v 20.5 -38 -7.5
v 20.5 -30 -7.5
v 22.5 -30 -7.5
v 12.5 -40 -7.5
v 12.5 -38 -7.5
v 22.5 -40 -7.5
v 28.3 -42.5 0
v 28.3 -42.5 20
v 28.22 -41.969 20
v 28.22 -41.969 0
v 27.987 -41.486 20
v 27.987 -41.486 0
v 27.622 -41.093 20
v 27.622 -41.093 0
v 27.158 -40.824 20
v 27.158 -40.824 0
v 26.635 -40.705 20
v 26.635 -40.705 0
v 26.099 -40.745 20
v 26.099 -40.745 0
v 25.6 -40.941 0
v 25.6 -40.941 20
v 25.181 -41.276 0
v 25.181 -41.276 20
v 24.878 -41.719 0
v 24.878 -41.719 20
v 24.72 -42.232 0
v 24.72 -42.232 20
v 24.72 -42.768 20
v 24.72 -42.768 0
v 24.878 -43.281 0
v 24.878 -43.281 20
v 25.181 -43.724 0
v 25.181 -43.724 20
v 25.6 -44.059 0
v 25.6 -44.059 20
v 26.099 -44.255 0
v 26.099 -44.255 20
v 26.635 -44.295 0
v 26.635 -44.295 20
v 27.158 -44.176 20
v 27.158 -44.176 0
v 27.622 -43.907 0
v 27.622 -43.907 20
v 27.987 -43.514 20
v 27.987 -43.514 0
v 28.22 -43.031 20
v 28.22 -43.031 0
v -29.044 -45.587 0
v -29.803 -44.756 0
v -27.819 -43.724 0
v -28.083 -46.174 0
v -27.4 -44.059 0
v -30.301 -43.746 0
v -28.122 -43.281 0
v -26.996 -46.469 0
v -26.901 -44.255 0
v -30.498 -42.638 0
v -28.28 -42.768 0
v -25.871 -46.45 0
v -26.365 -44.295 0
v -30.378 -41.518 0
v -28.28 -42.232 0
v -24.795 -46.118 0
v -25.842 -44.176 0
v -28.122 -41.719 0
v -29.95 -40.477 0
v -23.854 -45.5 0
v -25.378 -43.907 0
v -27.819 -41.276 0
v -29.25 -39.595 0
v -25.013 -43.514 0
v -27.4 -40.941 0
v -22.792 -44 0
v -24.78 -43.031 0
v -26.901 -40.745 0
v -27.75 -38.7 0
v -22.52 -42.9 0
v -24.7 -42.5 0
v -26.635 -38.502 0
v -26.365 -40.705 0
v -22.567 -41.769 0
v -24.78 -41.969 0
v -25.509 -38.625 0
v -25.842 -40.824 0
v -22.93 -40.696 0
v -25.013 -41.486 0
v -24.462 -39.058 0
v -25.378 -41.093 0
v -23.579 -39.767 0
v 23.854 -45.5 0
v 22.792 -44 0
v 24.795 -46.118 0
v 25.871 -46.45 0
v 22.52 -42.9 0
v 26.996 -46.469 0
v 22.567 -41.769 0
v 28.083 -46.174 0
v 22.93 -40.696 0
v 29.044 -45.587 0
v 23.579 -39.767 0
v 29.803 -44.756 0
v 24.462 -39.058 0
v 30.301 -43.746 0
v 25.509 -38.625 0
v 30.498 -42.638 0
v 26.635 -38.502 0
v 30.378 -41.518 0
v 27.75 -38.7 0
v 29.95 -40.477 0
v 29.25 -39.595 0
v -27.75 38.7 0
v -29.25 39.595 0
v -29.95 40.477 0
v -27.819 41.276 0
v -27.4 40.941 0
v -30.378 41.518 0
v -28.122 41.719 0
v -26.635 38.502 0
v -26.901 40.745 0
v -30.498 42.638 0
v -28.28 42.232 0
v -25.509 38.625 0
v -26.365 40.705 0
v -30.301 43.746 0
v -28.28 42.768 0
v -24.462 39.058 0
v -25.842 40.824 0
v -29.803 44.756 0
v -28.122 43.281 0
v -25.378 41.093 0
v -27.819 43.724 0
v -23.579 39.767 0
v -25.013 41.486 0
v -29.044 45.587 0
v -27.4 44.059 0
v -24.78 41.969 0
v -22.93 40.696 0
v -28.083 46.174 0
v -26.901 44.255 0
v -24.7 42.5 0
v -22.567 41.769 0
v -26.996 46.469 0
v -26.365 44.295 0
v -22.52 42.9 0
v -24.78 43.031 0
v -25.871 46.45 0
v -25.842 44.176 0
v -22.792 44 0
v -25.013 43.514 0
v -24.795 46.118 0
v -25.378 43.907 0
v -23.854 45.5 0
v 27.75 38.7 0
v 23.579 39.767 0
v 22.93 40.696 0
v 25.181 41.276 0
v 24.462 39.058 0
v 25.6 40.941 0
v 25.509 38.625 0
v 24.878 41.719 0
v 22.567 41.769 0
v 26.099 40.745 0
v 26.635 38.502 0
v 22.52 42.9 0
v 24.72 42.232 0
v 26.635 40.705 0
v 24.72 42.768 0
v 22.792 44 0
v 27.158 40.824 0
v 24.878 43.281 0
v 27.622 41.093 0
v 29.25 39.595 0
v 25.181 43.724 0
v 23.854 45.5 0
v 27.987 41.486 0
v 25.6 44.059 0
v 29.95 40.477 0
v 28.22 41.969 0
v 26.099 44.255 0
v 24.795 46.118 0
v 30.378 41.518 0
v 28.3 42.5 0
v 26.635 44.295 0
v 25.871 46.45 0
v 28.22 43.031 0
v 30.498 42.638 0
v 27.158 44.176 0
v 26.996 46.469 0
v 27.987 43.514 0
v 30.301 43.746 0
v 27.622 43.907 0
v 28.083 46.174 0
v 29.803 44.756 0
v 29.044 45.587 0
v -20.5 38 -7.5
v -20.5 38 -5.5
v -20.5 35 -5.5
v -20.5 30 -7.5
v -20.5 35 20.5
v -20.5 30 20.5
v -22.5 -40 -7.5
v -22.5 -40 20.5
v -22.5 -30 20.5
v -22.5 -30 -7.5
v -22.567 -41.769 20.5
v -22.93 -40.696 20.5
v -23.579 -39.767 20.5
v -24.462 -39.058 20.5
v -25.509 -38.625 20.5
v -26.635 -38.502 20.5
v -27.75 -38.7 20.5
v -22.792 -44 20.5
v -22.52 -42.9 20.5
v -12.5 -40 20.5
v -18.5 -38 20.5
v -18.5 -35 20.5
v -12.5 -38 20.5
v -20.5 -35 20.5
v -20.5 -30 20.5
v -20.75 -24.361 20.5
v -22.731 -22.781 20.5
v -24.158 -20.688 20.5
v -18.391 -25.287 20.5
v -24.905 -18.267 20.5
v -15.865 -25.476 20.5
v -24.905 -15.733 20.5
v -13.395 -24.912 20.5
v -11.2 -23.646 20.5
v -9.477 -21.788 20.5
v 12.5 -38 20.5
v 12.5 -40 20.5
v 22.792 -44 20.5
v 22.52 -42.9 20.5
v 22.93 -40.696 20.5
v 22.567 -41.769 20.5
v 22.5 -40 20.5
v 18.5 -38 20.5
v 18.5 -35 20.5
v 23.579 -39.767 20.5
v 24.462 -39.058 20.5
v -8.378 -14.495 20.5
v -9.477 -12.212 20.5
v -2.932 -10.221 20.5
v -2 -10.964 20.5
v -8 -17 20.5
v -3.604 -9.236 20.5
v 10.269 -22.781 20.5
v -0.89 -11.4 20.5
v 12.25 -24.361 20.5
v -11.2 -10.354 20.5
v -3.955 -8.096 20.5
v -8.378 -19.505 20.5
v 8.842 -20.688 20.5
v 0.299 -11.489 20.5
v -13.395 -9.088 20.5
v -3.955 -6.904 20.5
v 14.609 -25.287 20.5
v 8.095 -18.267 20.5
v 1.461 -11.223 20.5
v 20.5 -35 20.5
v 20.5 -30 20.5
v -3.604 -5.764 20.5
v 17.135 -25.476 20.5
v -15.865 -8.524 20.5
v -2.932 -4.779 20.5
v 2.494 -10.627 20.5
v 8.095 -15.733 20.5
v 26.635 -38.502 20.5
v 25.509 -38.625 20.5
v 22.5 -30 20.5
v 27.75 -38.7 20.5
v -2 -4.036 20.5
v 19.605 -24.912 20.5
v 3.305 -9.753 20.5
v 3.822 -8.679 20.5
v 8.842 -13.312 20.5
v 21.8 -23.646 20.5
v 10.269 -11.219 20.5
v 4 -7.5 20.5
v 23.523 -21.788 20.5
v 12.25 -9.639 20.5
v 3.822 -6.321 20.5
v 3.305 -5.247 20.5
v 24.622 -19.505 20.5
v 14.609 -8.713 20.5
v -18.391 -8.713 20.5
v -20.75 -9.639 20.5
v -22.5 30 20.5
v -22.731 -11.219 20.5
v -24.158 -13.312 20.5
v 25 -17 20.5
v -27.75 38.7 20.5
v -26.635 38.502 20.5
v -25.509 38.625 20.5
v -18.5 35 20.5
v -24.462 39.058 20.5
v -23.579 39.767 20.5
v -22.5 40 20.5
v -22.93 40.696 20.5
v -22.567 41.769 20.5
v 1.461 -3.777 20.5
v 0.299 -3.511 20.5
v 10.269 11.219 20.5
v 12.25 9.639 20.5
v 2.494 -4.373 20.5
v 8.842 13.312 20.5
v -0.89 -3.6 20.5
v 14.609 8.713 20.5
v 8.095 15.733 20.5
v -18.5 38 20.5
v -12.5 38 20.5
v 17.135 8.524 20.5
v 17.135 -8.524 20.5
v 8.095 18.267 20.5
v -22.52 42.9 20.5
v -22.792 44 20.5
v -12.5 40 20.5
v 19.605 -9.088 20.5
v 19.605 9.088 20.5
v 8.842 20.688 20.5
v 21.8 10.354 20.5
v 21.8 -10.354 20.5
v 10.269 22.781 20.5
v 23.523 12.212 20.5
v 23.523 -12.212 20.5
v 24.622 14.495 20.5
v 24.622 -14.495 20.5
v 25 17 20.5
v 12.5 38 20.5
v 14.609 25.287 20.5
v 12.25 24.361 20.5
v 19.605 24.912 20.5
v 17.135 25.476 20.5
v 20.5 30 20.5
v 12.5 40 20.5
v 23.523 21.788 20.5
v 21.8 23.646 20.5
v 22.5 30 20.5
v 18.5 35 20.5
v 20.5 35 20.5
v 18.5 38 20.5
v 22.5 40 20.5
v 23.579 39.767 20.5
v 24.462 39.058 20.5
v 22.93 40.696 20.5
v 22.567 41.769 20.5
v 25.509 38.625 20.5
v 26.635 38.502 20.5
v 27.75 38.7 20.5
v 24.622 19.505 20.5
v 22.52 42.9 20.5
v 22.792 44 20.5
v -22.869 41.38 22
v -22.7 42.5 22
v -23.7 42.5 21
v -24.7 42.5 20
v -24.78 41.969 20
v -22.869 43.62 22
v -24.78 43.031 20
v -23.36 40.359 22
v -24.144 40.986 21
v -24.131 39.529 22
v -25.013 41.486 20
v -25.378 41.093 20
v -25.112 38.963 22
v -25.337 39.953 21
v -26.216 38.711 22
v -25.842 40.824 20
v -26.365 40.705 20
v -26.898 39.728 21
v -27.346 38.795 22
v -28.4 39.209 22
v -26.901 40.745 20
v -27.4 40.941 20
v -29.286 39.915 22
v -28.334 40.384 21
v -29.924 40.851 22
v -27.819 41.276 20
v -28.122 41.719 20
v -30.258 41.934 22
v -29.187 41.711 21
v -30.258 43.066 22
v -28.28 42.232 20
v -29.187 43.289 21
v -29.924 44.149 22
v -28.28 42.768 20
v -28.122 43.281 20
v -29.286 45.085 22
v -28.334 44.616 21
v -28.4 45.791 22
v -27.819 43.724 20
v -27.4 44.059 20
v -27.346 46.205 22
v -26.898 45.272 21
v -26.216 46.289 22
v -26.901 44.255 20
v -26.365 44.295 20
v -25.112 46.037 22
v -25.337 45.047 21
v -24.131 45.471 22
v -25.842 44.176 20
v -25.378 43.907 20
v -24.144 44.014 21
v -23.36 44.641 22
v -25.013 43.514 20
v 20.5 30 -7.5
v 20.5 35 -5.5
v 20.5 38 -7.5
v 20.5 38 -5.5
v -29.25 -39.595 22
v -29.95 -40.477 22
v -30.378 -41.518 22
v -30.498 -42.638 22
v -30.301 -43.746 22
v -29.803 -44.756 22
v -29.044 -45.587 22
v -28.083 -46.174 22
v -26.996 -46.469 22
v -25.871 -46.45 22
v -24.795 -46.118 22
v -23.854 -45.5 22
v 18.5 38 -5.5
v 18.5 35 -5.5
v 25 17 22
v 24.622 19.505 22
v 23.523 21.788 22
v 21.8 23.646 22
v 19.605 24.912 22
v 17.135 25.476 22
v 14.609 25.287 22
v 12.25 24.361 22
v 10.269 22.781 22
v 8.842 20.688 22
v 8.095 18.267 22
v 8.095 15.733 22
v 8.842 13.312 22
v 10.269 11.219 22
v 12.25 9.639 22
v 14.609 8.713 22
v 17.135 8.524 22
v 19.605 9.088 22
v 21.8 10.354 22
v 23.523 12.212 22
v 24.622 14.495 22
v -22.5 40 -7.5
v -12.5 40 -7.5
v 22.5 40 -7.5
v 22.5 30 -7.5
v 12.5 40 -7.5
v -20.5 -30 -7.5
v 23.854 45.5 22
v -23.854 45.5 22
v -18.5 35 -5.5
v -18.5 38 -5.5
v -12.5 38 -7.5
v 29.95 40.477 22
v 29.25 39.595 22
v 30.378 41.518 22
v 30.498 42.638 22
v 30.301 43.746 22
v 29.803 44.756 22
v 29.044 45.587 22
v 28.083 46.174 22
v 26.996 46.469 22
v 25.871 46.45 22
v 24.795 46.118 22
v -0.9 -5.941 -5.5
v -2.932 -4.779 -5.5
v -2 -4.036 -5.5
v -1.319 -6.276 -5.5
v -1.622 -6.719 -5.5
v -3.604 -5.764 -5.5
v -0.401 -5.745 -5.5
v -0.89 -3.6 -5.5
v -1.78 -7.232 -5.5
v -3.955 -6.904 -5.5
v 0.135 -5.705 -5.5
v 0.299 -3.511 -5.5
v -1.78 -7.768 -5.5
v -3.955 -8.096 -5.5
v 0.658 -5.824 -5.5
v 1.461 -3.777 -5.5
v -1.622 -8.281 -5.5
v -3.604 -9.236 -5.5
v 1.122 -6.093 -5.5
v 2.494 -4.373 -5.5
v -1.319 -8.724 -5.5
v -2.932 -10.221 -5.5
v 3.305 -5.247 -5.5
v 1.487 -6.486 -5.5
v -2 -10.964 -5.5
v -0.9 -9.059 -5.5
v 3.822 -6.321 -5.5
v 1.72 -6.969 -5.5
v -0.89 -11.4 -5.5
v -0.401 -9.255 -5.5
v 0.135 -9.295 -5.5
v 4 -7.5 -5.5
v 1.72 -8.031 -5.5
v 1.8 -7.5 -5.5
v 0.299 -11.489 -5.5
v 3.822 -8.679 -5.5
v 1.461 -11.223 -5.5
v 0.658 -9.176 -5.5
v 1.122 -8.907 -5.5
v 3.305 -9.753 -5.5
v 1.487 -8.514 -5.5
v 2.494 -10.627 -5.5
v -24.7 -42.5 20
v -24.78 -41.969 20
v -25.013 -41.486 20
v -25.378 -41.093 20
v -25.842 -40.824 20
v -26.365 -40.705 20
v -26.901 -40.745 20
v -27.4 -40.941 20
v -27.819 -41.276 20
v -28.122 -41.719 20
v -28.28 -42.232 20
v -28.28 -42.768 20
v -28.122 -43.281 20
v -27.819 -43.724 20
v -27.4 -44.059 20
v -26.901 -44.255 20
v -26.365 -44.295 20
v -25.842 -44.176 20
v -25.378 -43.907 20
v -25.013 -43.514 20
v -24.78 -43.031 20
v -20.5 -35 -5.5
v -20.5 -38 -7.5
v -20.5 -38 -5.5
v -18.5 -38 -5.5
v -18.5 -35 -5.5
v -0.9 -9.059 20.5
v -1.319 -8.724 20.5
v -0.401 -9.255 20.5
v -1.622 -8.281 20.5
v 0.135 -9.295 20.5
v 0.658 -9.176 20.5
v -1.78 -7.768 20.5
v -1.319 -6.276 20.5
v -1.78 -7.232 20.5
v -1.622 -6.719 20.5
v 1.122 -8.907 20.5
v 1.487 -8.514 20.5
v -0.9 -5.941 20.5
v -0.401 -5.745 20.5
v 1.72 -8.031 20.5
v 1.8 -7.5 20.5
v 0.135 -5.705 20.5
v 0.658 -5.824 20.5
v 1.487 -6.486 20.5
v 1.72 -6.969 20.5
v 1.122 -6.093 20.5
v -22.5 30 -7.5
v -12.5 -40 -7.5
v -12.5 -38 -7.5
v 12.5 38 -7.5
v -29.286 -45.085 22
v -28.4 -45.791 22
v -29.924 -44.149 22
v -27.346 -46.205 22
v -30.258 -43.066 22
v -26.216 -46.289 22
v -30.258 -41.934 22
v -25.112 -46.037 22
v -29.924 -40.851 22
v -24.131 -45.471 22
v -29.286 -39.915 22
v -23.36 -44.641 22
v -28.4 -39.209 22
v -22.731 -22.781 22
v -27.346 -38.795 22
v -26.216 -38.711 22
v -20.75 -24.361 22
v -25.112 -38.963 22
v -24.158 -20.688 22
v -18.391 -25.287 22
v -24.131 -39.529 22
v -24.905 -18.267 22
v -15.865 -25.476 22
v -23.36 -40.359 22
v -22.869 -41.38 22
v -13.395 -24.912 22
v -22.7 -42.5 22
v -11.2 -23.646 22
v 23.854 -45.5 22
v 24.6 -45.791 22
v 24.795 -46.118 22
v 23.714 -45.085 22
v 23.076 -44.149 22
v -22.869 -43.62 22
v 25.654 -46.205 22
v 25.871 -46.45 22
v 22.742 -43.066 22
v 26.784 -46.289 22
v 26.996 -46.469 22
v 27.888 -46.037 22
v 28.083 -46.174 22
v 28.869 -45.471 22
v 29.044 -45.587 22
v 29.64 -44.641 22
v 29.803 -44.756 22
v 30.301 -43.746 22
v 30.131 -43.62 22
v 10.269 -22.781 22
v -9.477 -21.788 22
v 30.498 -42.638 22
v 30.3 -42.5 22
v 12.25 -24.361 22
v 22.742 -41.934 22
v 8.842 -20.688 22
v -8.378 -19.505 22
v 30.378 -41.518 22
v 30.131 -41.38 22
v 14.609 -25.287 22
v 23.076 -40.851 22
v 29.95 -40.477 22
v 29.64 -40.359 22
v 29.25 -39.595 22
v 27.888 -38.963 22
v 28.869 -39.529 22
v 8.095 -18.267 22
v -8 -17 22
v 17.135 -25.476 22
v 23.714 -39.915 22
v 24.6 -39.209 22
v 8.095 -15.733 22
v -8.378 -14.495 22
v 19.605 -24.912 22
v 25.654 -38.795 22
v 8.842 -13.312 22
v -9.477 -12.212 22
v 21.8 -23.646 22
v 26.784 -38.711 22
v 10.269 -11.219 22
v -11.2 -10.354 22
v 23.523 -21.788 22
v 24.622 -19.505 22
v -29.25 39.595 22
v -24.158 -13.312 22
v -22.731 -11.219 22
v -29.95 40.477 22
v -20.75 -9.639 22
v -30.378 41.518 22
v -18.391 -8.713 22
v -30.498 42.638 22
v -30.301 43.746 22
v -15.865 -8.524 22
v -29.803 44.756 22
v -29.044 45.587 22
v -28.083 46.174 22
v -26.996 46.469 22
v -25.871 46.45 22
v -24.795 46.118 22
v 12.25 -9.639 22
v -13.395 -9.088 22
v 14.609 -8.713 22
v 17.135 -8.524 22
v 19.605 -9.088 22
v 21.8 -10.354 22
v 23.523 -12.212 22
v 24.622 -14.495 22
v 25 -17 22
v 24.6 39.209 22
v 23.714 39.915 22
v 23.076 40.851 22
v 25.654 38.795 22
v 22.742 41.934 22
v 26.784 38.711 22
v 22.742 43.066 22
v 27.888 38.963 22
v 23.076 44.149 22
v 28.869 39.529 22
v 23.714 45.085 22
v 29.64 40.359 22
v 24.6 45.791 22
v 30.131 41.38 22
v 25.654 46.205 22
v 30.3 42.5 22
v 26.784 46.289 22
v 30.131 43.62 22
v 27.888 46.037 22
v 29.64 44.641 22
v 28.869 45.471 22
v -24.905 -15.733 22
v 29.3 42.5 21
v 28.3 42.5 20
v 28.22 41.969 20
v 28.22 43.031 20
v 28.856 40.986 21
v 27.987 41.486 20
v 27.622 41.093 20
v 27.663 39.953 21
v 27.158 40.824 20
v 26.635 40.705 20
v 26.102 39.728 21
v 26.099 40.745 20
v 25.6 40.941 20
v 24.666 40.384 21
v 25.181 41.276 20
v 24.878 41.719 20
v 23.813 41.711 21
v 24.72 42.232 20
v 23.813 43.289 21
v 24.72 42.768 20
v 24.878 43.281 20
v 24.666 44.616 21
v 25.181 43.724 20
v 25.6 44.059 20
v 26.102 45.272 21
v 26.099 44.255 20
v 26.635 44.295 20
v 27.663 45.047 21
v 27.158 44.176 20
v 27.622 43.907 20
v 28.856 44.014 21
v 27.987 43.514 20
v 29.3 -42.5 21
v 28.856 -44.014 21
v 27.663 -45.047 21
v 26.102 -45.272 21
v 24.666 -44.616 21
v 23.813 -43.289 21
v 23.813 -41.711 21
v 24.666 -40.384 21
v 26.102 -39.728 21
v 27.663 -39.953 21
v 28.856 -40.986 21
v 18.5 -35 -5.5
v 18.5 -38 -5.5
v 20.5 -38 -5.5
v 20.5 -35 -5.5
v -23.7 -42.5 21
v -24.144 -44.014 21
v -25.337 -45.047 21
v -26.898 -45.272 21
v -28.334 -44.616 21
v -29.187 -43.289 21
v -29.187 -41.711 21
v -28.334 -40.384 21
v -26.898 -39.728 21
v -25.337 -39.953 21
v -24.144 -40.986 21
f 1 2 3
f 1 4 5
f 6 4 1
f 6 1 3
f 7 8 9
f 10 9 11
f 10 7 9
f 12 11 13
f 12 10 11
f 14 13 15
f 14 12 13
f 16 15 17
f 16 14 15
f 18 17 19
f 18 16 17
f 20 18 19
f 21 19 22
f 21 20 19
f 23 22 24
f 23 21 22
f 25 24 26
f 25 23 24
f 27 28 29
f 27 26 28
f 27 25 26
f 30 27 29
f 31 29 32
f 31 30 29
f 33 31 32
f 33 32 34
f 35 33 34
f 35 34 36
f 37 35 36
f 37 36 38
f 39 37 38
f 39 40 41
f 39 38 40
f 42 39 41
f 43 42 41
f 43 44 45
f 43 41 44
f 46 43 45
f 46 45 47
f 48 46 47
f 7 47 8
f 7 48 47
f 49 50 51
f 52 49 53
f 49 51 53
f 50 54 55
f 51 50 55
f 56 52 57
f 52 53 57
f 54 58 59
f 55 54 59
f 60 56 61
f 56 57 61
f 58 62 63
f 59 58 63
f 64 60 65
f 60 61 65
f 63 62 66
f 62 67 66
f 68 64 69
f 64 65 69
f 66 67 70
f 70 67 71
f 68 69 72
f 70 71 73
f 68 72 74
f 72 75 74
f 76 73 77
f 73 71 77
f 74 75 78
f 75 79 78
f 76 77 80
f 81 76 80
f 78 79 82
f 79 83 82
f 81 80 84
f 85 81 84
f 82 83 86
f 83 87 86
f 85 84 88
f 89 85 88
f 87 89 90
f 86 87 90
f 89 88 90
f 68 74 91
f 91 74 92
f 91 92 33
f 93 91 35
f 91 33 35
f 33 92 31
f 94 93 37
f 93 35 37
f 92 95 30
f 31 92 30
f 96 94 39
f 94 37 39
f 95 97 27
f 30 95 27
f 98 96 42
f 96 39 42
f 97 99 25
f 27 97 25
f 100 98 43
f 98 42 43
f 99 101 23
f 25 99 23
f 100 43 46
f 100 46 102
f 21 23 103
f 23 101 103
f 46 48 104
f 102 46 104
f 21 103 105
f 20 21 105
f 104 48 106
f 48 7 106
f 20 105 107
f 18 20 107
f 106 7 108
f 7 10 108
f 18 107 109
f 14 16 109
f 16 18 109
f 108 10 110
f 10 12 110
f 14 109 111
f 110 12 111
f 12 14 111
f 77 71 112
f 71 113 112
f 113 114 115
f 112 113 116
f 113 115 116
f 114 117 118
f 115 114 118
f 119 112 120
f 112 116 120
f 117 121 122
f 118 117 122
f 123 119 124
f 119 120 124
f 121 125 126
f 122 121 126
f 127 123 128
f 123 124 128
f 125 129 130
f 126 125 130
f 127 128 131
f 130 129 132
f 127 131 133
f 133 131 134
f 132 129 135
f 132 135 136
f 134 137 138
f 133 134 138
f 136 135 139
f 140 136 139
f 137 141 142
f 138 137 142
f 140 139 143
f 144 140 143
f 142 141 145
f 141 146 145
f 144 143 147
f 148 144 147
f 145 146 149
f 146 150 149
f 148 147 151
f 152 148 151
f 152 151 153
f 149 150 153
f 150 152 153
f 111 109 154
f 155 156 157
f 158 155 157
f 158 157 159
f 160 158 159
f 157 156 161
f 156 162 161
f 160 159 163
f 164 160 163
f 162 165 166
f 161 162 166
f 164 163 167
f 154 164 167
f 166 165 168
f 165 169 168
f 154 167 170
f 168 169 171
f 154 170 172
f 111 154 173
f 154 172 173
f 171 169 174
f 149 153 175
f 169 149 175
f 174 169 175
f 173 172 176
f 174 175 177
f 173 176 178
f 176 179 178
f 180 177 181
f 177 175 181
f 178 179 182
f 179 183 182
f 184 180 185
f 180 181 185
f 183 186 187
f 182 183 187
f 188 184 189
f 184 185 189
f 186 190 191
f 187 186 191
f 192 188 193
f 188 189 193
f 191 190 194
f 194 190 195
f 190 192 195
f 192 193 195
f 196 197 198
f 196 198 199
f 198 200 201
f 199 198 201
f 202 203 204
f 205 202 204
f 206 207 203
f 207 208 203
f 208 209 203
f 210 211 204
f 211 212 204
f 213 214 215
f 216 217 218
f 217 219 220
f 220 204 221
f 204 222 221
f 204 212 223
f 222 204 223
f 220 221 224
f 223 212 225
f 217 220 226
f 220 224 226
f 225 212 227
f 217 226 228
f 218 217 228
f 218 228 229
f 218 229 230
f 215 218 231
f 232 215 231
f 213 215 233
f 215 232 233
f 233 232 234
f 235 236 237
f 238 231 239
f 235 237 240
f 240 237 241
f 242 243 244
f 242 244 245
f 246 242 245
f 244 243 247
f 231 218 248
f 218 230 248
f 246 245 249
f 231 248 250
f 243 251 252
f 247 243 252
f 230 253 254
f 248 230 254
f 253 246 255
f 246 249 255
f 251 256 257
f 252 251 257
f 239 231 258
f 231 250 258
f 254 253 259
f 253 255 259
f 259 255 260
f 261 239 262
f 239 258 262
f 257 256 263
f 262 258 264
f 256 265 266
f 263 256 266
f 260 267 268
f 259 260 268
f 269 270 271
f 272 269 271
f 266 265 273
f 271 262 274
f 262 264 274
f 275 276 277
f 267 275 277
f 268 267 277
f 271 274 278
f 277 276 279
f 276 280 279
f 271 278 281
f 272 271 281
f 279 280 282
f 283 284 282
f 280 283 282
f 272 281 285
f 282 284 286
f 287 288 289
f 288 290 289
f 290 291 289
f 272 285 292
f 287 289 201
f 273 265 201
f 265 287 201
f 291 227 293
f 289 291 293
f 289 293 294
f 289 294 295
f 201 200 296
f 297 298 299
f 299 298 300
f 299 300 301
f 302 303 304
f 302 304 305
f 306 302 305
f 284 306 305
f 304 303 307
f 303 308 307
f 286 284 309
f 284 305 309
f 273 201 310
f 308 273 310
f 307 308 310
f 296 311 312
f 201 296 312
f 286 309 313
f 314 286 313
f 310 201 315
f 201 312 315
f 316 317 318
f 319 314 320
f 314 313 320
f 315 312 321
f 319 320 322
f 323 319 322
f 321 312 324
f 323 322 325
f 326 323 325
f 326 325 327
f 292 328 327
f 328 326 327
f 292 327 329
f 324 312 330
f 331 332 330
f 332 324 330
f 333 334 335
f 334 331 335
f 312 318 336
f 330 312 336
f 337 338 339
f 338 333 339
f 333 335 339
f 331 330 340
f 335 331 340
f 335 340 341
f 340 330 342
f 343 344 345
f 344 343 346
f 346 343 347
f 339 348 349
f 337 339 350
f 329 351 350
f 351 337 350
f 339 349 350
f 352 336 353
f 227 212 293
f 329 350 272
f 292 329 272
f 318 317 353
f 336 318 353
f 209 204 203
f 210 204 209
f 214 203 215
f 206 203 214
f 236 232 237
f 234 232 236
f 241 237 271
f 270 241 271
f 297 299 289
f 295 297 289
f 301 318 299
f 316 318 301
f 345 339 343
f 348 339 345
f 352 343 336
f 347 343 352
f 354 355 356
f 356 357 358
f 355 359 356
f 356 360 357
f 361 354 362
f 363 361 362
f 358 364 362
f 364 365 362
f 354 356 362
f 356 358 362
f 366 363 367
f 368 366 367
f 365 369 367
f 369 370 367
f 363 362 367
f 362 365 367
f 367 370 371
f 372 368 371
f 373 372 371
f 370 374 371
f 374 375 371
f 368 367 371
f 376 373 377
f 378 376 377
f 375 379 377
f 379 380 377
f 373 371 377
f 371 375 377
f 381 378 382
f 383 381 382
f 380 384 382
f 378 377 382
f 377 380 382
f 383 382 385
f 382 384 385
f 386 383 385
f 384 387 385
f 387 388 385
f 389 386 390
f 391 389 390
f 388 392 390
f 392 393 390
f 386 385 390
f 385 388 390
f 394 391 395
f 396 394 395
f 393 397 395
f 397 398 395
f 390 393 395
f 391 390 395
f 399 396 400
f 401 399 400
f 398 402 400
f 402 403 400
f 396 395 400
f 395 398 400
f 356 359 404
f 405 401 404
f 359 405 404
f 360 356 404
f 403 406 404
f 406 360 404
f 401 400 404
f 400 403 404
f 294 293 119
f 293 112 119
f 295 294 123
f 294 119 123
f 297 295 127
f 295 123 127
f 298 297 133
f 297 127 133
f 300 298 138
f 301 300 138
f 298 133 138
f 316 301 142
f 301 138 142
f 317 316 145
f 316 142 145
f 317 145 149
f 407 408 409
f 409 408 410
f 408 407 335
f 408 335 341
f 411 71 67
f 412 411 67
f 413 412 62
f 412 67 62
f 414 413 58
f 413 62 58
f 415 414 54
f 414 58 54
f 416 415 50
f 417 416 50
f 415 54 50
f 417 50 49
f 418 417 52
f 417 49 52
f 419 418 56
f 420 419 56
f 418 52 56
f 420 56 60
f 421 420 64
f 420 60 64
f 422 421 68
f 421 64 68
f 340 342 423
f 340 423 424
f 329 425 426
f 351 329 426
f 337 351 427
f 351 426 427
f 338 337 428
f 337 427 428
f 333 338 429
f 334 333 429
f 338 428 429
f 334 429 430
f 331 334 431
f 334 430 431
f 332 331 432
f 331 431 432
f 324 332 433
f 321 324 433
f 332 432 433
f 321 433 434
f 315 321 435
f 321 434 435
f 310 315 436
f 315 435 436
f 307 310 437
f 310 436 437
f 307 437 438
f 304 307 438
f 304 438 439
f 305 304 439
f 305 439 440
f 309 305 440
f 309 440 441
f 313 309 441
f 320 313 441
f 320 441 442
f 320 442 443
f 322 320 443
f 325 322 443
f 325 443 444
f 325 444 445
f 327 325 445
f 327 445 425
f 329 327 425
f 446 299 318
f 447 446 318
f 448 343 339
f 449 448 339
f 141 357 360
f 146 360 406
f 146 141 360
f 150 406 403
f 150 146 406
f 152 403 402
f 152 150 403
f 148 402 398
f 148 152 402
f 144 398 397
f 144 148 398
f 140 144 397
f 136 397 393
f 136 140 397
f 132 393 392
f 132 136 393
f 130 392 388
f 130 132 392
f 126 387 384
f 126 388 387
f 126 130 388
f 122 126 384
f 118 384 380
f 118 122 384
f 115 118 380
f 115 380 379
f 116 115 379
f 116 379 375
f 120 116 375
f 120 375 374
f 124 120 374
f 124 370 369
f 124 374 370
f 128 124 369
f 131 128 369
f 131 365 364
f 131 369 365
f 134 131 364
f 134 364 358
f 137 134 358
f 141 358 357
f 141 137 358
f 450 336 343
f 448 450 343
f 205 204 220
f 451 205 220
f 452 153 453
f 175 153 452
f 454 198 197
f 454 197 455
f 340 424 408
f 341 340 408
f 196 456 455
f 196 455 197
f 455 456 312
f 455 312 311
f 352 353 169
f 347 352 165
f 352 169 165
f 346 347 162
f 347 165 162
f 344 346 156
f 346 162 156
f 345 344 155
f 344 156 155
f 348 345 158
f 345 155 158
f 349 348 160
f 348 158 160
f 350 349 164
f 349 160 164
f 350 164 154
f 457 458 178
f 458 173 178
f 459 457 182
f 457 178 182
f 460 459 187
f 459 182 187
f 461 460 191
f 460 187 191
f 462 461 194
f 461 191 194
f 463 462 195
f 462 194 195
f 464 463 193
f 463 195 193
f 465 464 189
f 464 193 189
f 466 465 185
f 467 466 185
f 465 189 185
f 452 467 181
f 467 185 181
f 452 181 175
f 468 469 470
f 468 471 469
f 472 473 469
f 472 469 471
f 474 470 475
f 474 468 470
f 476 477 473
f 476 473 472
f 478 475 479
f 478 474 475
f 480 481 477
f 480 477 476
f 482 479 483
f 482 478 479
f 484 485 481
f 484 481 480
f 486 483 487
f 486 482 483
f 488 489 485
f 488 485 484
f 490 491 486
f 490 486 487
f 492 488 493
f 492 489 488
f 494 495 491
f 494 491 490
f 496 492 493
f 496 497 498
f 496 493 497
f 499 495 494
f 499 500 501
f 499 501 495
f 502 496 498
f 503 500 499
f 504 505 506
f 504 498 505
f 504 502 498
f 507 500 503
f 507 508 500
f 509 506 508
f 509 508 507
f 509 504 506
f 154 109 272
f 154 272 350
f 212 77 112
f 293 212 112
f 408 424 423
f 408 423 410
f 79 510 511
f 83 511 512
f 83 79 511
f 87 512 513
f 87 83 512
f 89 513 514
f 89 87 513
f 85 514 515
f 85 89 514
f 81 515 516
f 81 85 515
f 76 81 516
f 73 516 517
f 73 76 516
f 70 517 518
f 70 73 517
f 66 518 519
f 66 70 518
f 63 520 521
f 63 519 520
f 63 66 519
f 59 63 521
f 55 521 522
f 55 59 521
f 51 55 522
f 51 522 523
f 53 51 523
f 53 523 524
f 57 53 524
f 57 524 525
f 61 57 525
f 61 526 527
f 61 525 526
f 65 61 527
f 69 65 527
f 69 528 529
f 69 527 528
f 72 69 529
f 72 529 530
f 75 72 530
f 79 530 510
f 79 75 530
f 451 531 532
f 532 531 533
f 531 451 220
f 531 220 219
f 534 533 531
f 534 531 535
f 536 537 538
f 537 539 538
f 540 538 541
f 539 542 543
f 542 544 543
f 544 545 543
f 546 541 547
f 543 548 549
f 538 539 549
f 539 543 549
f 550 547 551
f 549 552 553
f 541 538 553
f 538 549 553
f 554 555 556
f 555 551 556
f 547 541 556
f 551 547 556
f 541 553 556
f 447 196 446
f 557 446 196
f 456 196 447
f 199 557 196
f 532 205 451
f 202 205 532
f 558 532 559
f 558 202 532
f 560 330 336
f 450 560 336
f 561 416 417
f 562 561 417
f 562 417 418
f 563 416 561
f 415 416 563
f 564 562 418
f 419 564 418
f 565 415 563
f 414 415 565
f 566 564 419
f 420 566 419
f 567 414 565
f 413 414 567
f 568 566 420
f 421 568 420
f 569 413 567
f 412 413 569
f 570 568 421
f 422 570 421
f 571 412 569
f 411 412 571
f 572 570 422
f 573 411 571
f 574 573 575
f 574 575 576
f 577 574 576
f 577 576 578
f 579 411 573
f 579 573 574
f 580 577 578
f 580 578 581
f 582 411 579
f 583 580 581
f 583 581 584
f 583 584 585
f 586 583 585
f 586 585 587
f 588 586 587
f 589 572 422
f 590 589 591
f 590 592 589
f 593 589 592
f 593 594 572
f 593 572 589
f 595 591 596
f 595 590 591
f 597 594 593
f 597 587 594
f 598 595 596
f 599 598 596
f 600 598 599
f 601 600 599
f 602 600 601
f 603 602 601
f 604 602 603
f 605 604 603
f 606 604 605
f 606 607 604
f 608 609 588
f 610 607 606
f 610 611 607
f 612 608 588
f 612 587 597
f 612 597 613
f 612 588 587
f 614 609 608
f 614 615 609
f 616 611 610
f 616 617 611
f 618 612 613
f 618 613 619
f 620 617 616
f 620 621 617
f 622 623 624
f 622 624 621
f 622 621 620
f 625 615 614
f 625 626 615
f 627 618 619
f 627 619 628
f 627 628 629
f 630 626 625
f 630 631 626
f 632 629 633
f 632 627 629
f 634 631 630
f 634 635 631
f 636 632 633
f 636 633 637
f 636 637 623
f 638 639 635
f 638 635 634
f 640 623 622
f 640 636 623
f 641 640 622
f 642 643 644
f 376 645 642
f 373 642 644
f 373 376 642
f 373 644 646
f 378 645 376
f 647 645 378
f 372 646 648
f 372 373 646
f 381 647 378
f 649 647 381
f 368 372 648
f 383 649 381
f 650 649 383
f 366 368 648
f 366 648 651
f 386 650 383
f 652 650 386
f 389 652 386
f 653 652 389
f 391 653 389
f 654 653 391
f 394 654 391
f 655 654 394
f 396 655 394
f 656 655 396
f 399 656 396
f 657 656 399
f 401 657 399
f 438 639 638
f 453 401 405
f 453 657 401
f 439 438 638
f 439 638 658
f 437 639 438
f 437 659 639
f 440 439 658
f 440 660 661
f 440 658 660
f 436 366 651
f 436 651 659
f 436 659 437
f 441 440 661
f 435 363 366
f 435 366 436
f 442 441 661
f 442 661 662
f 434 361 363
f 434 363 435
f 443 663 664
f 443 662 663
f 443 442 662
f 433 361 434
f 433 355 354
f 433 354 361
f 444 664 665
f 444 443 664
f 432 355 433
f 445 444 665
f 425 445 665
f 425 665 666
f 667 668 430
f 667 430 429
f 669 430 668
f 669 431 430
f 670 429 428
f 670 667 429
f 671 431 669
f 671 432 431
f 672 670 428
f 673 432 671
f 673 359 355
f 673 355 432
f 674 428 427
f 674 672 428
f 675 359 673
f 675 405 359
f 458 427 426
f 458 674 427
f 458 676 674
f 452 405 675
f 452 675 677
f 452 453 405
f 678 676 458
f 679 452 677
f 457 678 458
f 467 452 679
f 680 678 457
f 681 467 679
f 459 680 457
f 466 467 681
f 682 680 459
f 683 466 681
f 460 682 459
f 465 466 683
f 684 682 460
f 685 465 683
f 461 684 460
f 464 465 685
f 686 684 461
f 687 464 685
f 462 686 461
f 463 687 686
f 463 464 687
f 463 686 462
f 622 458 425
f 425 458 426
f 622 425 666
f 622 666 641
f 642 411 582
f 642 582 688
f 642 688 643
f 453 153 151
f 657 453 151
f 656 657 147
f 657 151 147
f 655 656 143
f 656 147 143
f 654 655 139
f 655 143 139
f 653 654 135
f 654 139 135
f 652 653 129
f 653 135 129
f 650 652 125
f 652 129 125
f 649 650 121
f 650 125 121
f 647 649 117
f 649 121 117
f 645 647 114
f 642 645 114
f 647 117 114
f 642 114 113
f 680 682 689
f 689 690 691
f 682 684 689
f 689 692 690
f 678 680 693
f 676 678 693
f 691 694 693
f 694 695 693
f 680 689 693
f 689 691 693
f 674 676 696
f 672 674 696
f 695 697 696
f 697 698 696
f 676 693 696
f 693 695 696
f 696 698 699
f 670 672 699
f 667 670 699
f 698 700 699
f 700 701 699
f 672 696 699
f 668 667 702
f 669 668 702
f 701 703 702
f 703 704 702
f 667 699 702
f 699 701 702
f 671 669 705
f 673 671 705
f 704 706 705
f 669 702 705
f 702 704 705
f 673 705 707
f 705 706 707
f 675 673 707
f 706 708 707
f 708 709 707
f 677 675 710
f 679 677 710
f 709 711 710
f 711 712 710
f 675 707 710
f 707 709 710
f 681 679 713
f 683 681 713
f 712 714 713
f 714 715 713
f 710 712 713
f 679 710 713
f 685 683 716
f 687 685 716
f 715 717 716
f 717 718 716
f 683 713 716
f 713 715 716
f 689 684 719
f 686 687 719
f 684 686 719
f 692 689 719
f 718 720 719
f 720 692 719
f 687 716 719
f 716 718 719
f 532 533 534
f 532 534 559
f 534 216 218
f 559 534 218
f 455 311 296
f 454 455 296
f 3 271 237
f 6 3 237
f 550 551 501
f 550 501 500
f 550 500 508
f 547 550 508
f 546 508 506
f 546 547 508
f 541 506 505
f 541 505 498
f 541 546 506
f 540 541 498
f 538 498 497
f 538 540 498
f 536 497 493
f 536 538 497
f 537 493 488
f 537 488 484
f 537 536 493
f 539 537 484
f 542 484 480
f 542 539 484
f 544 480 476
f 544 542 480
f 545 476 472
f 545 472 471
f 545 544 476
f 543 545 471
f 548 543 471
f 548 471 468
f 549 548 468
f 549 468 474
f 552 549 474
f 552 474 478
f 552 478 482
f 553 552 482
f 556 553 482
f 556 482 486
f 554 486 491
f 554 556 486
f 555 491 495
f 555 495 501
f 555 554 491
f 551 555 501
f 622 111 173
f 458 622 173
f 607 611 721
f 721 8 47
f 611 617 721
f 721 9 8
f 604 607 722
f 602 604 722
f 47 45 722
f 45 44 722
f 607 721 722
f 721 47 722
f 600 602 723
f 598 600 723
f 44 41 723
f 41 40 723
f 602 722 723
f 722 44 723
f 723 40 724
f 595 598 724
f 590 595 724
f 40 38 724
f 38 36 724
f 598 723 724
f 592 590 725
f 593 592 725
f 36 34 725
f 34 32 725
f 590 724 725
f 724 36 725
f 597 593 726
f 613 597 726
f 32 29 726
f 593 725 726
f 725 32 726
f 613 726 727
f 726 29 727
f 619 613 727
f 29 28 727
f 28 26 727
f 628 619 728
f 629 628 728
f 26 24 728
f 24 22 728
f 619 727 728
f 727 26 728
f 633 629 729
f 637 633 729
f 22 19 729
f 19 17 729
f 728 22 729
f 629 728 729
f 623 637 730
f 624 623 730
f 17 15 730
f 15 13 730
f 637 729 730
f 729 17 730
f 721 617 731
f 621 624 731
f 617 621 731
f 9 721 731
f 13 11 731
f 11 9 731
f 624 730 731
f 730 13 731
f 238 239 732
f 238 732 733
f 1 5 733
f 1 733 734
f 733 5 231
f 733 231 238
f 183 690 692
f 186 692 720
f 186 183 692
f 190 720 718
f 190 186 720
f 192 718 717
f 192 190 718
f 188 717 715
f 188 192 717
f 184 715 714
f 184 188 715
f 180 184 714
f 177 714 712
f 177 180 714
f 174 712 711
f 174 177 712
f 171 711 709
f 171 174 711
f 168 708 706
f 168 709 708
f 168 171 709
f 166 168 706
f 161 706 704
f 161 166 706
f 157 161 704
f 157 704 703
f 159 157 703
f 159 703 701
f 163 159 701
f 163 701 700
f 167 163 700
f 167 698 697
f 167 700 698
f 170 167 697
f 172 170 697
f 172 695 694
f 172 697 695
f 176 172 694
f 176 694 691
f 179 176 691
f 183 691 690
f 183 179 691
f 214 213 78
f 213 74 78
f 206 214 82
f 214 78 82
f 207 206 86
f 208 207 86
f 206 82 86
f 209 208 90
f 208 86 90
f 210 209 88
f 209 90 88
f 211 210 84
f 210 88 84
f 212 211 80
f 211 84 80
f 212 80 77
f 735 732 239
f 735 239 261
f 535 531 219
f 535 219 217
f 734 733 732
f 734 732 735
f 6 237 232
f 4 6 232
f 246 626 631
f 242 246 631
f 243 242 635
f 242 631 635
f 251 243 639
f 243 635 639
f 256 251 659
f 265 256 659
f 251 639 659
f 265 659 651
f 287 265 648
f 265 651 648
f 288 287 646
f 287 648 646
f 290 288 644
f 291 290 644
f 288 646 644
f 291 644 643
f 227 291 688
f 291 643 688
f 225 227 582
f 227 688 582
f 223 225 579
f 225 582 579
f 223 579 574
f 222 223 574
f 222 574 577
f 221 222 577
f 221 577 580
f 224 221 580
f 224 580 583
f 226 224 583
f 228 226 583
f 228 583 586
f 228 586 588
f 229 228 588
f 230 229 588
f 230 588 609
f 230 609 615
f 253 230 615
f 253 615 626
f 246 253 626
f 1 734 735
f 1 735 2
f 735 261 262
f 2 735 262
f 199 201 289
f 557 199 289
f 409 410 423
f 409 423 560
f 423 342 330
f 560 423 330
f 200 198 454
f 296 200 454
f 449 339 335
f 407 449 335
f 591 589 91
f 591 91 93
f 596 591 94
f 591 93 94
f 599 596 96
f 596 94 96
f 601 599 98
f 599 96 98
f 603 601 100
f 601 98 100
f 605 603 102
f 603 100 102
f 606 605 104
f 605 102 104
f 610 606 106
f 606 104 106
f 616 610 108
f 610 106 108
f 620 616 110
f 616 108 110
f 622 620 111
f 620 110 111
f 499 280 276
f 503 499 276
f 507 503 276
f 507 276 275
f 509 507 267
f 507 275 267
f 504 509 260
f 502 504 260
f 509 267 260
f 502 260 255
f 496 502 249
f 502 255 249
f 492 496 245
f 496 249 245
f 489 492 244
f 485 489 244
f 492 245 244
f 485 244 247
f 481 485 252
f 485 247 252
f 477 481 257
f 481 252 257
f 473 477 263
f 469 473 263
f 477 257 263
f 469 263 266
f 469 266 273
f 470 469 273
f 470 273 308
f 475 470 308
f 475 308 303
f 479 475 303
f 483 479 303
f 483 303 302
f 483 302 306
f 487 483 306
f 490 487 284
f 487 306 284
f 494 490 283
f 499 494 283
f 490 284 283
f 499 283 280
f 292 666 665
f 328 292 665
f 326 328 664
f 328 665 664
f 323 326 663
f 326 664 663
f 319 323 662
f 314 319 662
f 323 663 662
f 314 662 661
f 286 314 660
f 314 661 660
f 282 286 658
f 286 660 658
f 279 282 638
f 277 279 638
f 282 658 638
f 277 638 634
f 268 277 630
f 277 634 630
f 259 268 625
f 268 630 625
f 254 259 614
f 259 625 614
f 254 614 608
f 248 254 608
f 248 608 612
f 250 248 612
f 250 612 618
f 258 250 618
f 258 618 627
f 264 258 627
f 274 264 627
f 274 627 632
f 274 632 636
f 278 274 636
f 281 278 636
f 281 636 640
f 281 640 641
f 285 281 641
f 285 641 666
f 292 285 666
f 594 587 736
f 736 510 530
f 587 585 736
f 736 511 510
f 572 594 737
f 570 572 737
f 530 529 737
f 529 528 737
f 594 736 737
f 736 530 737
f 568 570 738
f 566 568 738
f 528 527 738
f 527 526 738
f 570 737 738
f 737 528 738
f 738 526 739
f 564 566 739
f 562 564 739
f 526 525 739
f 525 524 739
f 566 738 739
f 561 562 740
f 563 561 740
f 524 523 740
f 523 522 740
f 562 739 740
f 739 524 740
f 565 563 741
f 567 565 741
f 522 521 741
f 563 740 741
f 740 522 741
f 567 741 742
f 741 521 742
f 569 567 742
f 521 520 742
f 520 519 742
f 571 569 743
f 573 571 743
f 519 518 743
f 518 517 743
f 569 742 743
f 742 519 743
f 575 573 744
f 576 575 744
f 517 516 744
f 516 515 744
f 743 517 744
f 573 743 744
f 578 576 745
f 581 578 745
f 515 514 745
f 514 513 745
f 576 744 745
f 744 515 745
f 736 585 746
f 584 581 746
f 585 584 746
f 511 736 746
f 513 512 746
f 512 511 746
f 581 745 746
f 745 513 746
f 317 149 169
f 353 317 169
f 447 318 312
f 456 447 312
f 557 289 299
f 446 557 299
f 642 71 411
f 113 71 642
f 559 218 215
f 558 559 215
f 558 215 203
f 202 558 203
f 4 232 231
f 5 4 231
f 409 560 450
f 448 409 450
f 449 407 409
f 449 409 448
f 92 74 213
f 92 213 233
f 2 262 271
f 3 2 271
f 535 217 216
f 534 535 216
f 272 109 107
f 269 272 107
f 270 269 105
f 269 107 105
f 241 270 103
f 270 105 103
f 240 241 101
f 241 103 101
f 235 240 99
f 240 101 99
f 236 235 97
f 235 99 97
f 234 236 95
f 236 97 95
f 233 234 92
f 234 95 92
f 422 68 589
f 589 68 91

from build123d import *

# Parameters (mm, degrees)
F0_W      = 58.5
F0_H      = 91
F1_DEPTH  = 22
F2_T      = -1.5
F3_R      = 8.5
F4_DEPTH  = 25
F5_R      = 3
F6_R      = 2
F8_DEPTH  = 28
F9_W      = 2
F9_H      = 3
F9_R      = 4
F9_R_2    = 1.8
F10_DEPTH = 26
F11_R     = 4
F12_DEPTH = 22
F13_R     = 1.8
F14_DEPTH = 26
F16_SIZE  = 2


with BuildPart() as f1:
    # F0 (on Top) → F1 (new body)
    with BuildSketch(Plane.XY):
        Rectangle(F0_W, F0_H)
    extrude(amount=F1_DEPTH)

    # F2
    f2_openings = [f1.faces().sort_by_distance(p)[0] for p in [
        (0, 0, 0),
    ]]
    offset(amount=F2_T, openings=f2_openings)

    # F3 (on face) → F4 (cut)
    with BuildSketch(Plane.XY.offset(22)):
        with Locations((16.5, 17)):
            Circle(F3_R)
        with Locations((16.5, -17)):
            Circle(F3_R)
        with Locations((-16.5, -17)):
            Circle(F3_R)
    extrude(amount=-F4_DEPTH, mode=Mode.SUBTRACT)

    # F5
    f5_edges = [f1.edges().sort_by_distance(p)[0] for p in [
        (-29.25, 45.5, 11),
        (29.25, 45.5, 11),
        (-29.25, -45.5, 11),
        (29.25, -45.5, 11),
    ]]
    fillet(f5_edges, radius=F5_R)

    # F6
    f6_edges = [f1.edges().sort_by_distance(p)[0] for p in [
        (-27.75, 44, 10.25),
        (-27.75, -44, 10.25),
        (27.75, -44, 10.25),
        (27.75, 44, 10.25),
    ]]
    fillet(f6_edges, radius=F6_R)

    # F7 (on face) → F8 (join)
    with BuildSketch(Plane(origin=(0, 0, 20.5), x_dir=(1, 0, 0), z_dir=(0, 0, -1))):
        Polygon((12.5, 38), (20.5, 38), (20.5, 30), (22.5, 30), (22.5, 40), (12.5, 40), align=None)
        Polygon((20.5, -30), (20.5, -38), (12.5, -38), (12.5, -40), (22.5, -40), (22.5, -30), align=None)
        Polygon((-20.5, 30), (-20.5, 38), (-12.5, 38), (-12.5, 40), (-22.5, 40), (-22.5, 30), align=None)
        Polygon((-12.5, -40), (-12.5, -38), (-20.5, -38), (-20.5, -30), (-22.5, -30), (-22.5, -40), align=None)
    extrude(amount=F8_DEPTH)

    # F9 (on face) → F10 (join)
    with BuildSketch(Plane(origin=(0, 0, 20.5), x_dir=(1, 0, 0), z_dir=(0, 0, -1))):
        with Locations((19.5, 36.5)):
            Rectangle(F9_W, F9_H)
        with Locations((-19.5, 36.5)):
            Rectangle(F9_W, F9_H)
        with Locations((-19.5, -36.5)):
            Rectangle(F9_W, F9_H)
        with Locations((19.5, -36.5)):
            Rectangle(F9_W, F9_H)
        with Locations((0, 7.5)):
            Circle(F9_R)
        with Locations((0, 7.5)):
            Circle(F9_R_2, mode=Mode.SUBTRACT)
    extrude(amount=F10_DEPTH)

    # F11 (on face) → F12 (join)
    with BuildSketch(Plane.XY):
        with Locations((26.5, -42.5)):
            Circle(F11_R)
        with Locations((26.5, 42.5)):
            Circle(F11_R)
        with Locations((-26.5, 42.5)):
            Circle(F11_R)
        with Locations((-26.5, -42.5)):
            Circle(F11_R)
    extrude(amount=F12_DEPTH)

    # F13 (on Top) → F14 (cut)
    with BuildSketch(Plane.XY):
        with Locations((26.5, -42.5)):
            Circle(F13_R)
        with Locations((26.5, 42.5)):
            Circle(F13_R)
        with Locations((-26.5, -42.5)):
            Circle(F13_R)
        with Locations((-26.5, 42.5)):
            Circle(F13_R)
    extrude(amount=F14_DEPTH, mode=Mode.SUBTRACT)

    # F16
    f16_edges = [f1.edges().sort_by_distance(p)[0] for p in [
        (24.7, -42.5, 22),
        (24.7, 42.5, 22),
        (-28.3, 42.5, 22),
        (-28.3, -42.5, 22),
    ]]
    chamfer(f16_edges, length=F16_SIZE)


solid = f1.part
